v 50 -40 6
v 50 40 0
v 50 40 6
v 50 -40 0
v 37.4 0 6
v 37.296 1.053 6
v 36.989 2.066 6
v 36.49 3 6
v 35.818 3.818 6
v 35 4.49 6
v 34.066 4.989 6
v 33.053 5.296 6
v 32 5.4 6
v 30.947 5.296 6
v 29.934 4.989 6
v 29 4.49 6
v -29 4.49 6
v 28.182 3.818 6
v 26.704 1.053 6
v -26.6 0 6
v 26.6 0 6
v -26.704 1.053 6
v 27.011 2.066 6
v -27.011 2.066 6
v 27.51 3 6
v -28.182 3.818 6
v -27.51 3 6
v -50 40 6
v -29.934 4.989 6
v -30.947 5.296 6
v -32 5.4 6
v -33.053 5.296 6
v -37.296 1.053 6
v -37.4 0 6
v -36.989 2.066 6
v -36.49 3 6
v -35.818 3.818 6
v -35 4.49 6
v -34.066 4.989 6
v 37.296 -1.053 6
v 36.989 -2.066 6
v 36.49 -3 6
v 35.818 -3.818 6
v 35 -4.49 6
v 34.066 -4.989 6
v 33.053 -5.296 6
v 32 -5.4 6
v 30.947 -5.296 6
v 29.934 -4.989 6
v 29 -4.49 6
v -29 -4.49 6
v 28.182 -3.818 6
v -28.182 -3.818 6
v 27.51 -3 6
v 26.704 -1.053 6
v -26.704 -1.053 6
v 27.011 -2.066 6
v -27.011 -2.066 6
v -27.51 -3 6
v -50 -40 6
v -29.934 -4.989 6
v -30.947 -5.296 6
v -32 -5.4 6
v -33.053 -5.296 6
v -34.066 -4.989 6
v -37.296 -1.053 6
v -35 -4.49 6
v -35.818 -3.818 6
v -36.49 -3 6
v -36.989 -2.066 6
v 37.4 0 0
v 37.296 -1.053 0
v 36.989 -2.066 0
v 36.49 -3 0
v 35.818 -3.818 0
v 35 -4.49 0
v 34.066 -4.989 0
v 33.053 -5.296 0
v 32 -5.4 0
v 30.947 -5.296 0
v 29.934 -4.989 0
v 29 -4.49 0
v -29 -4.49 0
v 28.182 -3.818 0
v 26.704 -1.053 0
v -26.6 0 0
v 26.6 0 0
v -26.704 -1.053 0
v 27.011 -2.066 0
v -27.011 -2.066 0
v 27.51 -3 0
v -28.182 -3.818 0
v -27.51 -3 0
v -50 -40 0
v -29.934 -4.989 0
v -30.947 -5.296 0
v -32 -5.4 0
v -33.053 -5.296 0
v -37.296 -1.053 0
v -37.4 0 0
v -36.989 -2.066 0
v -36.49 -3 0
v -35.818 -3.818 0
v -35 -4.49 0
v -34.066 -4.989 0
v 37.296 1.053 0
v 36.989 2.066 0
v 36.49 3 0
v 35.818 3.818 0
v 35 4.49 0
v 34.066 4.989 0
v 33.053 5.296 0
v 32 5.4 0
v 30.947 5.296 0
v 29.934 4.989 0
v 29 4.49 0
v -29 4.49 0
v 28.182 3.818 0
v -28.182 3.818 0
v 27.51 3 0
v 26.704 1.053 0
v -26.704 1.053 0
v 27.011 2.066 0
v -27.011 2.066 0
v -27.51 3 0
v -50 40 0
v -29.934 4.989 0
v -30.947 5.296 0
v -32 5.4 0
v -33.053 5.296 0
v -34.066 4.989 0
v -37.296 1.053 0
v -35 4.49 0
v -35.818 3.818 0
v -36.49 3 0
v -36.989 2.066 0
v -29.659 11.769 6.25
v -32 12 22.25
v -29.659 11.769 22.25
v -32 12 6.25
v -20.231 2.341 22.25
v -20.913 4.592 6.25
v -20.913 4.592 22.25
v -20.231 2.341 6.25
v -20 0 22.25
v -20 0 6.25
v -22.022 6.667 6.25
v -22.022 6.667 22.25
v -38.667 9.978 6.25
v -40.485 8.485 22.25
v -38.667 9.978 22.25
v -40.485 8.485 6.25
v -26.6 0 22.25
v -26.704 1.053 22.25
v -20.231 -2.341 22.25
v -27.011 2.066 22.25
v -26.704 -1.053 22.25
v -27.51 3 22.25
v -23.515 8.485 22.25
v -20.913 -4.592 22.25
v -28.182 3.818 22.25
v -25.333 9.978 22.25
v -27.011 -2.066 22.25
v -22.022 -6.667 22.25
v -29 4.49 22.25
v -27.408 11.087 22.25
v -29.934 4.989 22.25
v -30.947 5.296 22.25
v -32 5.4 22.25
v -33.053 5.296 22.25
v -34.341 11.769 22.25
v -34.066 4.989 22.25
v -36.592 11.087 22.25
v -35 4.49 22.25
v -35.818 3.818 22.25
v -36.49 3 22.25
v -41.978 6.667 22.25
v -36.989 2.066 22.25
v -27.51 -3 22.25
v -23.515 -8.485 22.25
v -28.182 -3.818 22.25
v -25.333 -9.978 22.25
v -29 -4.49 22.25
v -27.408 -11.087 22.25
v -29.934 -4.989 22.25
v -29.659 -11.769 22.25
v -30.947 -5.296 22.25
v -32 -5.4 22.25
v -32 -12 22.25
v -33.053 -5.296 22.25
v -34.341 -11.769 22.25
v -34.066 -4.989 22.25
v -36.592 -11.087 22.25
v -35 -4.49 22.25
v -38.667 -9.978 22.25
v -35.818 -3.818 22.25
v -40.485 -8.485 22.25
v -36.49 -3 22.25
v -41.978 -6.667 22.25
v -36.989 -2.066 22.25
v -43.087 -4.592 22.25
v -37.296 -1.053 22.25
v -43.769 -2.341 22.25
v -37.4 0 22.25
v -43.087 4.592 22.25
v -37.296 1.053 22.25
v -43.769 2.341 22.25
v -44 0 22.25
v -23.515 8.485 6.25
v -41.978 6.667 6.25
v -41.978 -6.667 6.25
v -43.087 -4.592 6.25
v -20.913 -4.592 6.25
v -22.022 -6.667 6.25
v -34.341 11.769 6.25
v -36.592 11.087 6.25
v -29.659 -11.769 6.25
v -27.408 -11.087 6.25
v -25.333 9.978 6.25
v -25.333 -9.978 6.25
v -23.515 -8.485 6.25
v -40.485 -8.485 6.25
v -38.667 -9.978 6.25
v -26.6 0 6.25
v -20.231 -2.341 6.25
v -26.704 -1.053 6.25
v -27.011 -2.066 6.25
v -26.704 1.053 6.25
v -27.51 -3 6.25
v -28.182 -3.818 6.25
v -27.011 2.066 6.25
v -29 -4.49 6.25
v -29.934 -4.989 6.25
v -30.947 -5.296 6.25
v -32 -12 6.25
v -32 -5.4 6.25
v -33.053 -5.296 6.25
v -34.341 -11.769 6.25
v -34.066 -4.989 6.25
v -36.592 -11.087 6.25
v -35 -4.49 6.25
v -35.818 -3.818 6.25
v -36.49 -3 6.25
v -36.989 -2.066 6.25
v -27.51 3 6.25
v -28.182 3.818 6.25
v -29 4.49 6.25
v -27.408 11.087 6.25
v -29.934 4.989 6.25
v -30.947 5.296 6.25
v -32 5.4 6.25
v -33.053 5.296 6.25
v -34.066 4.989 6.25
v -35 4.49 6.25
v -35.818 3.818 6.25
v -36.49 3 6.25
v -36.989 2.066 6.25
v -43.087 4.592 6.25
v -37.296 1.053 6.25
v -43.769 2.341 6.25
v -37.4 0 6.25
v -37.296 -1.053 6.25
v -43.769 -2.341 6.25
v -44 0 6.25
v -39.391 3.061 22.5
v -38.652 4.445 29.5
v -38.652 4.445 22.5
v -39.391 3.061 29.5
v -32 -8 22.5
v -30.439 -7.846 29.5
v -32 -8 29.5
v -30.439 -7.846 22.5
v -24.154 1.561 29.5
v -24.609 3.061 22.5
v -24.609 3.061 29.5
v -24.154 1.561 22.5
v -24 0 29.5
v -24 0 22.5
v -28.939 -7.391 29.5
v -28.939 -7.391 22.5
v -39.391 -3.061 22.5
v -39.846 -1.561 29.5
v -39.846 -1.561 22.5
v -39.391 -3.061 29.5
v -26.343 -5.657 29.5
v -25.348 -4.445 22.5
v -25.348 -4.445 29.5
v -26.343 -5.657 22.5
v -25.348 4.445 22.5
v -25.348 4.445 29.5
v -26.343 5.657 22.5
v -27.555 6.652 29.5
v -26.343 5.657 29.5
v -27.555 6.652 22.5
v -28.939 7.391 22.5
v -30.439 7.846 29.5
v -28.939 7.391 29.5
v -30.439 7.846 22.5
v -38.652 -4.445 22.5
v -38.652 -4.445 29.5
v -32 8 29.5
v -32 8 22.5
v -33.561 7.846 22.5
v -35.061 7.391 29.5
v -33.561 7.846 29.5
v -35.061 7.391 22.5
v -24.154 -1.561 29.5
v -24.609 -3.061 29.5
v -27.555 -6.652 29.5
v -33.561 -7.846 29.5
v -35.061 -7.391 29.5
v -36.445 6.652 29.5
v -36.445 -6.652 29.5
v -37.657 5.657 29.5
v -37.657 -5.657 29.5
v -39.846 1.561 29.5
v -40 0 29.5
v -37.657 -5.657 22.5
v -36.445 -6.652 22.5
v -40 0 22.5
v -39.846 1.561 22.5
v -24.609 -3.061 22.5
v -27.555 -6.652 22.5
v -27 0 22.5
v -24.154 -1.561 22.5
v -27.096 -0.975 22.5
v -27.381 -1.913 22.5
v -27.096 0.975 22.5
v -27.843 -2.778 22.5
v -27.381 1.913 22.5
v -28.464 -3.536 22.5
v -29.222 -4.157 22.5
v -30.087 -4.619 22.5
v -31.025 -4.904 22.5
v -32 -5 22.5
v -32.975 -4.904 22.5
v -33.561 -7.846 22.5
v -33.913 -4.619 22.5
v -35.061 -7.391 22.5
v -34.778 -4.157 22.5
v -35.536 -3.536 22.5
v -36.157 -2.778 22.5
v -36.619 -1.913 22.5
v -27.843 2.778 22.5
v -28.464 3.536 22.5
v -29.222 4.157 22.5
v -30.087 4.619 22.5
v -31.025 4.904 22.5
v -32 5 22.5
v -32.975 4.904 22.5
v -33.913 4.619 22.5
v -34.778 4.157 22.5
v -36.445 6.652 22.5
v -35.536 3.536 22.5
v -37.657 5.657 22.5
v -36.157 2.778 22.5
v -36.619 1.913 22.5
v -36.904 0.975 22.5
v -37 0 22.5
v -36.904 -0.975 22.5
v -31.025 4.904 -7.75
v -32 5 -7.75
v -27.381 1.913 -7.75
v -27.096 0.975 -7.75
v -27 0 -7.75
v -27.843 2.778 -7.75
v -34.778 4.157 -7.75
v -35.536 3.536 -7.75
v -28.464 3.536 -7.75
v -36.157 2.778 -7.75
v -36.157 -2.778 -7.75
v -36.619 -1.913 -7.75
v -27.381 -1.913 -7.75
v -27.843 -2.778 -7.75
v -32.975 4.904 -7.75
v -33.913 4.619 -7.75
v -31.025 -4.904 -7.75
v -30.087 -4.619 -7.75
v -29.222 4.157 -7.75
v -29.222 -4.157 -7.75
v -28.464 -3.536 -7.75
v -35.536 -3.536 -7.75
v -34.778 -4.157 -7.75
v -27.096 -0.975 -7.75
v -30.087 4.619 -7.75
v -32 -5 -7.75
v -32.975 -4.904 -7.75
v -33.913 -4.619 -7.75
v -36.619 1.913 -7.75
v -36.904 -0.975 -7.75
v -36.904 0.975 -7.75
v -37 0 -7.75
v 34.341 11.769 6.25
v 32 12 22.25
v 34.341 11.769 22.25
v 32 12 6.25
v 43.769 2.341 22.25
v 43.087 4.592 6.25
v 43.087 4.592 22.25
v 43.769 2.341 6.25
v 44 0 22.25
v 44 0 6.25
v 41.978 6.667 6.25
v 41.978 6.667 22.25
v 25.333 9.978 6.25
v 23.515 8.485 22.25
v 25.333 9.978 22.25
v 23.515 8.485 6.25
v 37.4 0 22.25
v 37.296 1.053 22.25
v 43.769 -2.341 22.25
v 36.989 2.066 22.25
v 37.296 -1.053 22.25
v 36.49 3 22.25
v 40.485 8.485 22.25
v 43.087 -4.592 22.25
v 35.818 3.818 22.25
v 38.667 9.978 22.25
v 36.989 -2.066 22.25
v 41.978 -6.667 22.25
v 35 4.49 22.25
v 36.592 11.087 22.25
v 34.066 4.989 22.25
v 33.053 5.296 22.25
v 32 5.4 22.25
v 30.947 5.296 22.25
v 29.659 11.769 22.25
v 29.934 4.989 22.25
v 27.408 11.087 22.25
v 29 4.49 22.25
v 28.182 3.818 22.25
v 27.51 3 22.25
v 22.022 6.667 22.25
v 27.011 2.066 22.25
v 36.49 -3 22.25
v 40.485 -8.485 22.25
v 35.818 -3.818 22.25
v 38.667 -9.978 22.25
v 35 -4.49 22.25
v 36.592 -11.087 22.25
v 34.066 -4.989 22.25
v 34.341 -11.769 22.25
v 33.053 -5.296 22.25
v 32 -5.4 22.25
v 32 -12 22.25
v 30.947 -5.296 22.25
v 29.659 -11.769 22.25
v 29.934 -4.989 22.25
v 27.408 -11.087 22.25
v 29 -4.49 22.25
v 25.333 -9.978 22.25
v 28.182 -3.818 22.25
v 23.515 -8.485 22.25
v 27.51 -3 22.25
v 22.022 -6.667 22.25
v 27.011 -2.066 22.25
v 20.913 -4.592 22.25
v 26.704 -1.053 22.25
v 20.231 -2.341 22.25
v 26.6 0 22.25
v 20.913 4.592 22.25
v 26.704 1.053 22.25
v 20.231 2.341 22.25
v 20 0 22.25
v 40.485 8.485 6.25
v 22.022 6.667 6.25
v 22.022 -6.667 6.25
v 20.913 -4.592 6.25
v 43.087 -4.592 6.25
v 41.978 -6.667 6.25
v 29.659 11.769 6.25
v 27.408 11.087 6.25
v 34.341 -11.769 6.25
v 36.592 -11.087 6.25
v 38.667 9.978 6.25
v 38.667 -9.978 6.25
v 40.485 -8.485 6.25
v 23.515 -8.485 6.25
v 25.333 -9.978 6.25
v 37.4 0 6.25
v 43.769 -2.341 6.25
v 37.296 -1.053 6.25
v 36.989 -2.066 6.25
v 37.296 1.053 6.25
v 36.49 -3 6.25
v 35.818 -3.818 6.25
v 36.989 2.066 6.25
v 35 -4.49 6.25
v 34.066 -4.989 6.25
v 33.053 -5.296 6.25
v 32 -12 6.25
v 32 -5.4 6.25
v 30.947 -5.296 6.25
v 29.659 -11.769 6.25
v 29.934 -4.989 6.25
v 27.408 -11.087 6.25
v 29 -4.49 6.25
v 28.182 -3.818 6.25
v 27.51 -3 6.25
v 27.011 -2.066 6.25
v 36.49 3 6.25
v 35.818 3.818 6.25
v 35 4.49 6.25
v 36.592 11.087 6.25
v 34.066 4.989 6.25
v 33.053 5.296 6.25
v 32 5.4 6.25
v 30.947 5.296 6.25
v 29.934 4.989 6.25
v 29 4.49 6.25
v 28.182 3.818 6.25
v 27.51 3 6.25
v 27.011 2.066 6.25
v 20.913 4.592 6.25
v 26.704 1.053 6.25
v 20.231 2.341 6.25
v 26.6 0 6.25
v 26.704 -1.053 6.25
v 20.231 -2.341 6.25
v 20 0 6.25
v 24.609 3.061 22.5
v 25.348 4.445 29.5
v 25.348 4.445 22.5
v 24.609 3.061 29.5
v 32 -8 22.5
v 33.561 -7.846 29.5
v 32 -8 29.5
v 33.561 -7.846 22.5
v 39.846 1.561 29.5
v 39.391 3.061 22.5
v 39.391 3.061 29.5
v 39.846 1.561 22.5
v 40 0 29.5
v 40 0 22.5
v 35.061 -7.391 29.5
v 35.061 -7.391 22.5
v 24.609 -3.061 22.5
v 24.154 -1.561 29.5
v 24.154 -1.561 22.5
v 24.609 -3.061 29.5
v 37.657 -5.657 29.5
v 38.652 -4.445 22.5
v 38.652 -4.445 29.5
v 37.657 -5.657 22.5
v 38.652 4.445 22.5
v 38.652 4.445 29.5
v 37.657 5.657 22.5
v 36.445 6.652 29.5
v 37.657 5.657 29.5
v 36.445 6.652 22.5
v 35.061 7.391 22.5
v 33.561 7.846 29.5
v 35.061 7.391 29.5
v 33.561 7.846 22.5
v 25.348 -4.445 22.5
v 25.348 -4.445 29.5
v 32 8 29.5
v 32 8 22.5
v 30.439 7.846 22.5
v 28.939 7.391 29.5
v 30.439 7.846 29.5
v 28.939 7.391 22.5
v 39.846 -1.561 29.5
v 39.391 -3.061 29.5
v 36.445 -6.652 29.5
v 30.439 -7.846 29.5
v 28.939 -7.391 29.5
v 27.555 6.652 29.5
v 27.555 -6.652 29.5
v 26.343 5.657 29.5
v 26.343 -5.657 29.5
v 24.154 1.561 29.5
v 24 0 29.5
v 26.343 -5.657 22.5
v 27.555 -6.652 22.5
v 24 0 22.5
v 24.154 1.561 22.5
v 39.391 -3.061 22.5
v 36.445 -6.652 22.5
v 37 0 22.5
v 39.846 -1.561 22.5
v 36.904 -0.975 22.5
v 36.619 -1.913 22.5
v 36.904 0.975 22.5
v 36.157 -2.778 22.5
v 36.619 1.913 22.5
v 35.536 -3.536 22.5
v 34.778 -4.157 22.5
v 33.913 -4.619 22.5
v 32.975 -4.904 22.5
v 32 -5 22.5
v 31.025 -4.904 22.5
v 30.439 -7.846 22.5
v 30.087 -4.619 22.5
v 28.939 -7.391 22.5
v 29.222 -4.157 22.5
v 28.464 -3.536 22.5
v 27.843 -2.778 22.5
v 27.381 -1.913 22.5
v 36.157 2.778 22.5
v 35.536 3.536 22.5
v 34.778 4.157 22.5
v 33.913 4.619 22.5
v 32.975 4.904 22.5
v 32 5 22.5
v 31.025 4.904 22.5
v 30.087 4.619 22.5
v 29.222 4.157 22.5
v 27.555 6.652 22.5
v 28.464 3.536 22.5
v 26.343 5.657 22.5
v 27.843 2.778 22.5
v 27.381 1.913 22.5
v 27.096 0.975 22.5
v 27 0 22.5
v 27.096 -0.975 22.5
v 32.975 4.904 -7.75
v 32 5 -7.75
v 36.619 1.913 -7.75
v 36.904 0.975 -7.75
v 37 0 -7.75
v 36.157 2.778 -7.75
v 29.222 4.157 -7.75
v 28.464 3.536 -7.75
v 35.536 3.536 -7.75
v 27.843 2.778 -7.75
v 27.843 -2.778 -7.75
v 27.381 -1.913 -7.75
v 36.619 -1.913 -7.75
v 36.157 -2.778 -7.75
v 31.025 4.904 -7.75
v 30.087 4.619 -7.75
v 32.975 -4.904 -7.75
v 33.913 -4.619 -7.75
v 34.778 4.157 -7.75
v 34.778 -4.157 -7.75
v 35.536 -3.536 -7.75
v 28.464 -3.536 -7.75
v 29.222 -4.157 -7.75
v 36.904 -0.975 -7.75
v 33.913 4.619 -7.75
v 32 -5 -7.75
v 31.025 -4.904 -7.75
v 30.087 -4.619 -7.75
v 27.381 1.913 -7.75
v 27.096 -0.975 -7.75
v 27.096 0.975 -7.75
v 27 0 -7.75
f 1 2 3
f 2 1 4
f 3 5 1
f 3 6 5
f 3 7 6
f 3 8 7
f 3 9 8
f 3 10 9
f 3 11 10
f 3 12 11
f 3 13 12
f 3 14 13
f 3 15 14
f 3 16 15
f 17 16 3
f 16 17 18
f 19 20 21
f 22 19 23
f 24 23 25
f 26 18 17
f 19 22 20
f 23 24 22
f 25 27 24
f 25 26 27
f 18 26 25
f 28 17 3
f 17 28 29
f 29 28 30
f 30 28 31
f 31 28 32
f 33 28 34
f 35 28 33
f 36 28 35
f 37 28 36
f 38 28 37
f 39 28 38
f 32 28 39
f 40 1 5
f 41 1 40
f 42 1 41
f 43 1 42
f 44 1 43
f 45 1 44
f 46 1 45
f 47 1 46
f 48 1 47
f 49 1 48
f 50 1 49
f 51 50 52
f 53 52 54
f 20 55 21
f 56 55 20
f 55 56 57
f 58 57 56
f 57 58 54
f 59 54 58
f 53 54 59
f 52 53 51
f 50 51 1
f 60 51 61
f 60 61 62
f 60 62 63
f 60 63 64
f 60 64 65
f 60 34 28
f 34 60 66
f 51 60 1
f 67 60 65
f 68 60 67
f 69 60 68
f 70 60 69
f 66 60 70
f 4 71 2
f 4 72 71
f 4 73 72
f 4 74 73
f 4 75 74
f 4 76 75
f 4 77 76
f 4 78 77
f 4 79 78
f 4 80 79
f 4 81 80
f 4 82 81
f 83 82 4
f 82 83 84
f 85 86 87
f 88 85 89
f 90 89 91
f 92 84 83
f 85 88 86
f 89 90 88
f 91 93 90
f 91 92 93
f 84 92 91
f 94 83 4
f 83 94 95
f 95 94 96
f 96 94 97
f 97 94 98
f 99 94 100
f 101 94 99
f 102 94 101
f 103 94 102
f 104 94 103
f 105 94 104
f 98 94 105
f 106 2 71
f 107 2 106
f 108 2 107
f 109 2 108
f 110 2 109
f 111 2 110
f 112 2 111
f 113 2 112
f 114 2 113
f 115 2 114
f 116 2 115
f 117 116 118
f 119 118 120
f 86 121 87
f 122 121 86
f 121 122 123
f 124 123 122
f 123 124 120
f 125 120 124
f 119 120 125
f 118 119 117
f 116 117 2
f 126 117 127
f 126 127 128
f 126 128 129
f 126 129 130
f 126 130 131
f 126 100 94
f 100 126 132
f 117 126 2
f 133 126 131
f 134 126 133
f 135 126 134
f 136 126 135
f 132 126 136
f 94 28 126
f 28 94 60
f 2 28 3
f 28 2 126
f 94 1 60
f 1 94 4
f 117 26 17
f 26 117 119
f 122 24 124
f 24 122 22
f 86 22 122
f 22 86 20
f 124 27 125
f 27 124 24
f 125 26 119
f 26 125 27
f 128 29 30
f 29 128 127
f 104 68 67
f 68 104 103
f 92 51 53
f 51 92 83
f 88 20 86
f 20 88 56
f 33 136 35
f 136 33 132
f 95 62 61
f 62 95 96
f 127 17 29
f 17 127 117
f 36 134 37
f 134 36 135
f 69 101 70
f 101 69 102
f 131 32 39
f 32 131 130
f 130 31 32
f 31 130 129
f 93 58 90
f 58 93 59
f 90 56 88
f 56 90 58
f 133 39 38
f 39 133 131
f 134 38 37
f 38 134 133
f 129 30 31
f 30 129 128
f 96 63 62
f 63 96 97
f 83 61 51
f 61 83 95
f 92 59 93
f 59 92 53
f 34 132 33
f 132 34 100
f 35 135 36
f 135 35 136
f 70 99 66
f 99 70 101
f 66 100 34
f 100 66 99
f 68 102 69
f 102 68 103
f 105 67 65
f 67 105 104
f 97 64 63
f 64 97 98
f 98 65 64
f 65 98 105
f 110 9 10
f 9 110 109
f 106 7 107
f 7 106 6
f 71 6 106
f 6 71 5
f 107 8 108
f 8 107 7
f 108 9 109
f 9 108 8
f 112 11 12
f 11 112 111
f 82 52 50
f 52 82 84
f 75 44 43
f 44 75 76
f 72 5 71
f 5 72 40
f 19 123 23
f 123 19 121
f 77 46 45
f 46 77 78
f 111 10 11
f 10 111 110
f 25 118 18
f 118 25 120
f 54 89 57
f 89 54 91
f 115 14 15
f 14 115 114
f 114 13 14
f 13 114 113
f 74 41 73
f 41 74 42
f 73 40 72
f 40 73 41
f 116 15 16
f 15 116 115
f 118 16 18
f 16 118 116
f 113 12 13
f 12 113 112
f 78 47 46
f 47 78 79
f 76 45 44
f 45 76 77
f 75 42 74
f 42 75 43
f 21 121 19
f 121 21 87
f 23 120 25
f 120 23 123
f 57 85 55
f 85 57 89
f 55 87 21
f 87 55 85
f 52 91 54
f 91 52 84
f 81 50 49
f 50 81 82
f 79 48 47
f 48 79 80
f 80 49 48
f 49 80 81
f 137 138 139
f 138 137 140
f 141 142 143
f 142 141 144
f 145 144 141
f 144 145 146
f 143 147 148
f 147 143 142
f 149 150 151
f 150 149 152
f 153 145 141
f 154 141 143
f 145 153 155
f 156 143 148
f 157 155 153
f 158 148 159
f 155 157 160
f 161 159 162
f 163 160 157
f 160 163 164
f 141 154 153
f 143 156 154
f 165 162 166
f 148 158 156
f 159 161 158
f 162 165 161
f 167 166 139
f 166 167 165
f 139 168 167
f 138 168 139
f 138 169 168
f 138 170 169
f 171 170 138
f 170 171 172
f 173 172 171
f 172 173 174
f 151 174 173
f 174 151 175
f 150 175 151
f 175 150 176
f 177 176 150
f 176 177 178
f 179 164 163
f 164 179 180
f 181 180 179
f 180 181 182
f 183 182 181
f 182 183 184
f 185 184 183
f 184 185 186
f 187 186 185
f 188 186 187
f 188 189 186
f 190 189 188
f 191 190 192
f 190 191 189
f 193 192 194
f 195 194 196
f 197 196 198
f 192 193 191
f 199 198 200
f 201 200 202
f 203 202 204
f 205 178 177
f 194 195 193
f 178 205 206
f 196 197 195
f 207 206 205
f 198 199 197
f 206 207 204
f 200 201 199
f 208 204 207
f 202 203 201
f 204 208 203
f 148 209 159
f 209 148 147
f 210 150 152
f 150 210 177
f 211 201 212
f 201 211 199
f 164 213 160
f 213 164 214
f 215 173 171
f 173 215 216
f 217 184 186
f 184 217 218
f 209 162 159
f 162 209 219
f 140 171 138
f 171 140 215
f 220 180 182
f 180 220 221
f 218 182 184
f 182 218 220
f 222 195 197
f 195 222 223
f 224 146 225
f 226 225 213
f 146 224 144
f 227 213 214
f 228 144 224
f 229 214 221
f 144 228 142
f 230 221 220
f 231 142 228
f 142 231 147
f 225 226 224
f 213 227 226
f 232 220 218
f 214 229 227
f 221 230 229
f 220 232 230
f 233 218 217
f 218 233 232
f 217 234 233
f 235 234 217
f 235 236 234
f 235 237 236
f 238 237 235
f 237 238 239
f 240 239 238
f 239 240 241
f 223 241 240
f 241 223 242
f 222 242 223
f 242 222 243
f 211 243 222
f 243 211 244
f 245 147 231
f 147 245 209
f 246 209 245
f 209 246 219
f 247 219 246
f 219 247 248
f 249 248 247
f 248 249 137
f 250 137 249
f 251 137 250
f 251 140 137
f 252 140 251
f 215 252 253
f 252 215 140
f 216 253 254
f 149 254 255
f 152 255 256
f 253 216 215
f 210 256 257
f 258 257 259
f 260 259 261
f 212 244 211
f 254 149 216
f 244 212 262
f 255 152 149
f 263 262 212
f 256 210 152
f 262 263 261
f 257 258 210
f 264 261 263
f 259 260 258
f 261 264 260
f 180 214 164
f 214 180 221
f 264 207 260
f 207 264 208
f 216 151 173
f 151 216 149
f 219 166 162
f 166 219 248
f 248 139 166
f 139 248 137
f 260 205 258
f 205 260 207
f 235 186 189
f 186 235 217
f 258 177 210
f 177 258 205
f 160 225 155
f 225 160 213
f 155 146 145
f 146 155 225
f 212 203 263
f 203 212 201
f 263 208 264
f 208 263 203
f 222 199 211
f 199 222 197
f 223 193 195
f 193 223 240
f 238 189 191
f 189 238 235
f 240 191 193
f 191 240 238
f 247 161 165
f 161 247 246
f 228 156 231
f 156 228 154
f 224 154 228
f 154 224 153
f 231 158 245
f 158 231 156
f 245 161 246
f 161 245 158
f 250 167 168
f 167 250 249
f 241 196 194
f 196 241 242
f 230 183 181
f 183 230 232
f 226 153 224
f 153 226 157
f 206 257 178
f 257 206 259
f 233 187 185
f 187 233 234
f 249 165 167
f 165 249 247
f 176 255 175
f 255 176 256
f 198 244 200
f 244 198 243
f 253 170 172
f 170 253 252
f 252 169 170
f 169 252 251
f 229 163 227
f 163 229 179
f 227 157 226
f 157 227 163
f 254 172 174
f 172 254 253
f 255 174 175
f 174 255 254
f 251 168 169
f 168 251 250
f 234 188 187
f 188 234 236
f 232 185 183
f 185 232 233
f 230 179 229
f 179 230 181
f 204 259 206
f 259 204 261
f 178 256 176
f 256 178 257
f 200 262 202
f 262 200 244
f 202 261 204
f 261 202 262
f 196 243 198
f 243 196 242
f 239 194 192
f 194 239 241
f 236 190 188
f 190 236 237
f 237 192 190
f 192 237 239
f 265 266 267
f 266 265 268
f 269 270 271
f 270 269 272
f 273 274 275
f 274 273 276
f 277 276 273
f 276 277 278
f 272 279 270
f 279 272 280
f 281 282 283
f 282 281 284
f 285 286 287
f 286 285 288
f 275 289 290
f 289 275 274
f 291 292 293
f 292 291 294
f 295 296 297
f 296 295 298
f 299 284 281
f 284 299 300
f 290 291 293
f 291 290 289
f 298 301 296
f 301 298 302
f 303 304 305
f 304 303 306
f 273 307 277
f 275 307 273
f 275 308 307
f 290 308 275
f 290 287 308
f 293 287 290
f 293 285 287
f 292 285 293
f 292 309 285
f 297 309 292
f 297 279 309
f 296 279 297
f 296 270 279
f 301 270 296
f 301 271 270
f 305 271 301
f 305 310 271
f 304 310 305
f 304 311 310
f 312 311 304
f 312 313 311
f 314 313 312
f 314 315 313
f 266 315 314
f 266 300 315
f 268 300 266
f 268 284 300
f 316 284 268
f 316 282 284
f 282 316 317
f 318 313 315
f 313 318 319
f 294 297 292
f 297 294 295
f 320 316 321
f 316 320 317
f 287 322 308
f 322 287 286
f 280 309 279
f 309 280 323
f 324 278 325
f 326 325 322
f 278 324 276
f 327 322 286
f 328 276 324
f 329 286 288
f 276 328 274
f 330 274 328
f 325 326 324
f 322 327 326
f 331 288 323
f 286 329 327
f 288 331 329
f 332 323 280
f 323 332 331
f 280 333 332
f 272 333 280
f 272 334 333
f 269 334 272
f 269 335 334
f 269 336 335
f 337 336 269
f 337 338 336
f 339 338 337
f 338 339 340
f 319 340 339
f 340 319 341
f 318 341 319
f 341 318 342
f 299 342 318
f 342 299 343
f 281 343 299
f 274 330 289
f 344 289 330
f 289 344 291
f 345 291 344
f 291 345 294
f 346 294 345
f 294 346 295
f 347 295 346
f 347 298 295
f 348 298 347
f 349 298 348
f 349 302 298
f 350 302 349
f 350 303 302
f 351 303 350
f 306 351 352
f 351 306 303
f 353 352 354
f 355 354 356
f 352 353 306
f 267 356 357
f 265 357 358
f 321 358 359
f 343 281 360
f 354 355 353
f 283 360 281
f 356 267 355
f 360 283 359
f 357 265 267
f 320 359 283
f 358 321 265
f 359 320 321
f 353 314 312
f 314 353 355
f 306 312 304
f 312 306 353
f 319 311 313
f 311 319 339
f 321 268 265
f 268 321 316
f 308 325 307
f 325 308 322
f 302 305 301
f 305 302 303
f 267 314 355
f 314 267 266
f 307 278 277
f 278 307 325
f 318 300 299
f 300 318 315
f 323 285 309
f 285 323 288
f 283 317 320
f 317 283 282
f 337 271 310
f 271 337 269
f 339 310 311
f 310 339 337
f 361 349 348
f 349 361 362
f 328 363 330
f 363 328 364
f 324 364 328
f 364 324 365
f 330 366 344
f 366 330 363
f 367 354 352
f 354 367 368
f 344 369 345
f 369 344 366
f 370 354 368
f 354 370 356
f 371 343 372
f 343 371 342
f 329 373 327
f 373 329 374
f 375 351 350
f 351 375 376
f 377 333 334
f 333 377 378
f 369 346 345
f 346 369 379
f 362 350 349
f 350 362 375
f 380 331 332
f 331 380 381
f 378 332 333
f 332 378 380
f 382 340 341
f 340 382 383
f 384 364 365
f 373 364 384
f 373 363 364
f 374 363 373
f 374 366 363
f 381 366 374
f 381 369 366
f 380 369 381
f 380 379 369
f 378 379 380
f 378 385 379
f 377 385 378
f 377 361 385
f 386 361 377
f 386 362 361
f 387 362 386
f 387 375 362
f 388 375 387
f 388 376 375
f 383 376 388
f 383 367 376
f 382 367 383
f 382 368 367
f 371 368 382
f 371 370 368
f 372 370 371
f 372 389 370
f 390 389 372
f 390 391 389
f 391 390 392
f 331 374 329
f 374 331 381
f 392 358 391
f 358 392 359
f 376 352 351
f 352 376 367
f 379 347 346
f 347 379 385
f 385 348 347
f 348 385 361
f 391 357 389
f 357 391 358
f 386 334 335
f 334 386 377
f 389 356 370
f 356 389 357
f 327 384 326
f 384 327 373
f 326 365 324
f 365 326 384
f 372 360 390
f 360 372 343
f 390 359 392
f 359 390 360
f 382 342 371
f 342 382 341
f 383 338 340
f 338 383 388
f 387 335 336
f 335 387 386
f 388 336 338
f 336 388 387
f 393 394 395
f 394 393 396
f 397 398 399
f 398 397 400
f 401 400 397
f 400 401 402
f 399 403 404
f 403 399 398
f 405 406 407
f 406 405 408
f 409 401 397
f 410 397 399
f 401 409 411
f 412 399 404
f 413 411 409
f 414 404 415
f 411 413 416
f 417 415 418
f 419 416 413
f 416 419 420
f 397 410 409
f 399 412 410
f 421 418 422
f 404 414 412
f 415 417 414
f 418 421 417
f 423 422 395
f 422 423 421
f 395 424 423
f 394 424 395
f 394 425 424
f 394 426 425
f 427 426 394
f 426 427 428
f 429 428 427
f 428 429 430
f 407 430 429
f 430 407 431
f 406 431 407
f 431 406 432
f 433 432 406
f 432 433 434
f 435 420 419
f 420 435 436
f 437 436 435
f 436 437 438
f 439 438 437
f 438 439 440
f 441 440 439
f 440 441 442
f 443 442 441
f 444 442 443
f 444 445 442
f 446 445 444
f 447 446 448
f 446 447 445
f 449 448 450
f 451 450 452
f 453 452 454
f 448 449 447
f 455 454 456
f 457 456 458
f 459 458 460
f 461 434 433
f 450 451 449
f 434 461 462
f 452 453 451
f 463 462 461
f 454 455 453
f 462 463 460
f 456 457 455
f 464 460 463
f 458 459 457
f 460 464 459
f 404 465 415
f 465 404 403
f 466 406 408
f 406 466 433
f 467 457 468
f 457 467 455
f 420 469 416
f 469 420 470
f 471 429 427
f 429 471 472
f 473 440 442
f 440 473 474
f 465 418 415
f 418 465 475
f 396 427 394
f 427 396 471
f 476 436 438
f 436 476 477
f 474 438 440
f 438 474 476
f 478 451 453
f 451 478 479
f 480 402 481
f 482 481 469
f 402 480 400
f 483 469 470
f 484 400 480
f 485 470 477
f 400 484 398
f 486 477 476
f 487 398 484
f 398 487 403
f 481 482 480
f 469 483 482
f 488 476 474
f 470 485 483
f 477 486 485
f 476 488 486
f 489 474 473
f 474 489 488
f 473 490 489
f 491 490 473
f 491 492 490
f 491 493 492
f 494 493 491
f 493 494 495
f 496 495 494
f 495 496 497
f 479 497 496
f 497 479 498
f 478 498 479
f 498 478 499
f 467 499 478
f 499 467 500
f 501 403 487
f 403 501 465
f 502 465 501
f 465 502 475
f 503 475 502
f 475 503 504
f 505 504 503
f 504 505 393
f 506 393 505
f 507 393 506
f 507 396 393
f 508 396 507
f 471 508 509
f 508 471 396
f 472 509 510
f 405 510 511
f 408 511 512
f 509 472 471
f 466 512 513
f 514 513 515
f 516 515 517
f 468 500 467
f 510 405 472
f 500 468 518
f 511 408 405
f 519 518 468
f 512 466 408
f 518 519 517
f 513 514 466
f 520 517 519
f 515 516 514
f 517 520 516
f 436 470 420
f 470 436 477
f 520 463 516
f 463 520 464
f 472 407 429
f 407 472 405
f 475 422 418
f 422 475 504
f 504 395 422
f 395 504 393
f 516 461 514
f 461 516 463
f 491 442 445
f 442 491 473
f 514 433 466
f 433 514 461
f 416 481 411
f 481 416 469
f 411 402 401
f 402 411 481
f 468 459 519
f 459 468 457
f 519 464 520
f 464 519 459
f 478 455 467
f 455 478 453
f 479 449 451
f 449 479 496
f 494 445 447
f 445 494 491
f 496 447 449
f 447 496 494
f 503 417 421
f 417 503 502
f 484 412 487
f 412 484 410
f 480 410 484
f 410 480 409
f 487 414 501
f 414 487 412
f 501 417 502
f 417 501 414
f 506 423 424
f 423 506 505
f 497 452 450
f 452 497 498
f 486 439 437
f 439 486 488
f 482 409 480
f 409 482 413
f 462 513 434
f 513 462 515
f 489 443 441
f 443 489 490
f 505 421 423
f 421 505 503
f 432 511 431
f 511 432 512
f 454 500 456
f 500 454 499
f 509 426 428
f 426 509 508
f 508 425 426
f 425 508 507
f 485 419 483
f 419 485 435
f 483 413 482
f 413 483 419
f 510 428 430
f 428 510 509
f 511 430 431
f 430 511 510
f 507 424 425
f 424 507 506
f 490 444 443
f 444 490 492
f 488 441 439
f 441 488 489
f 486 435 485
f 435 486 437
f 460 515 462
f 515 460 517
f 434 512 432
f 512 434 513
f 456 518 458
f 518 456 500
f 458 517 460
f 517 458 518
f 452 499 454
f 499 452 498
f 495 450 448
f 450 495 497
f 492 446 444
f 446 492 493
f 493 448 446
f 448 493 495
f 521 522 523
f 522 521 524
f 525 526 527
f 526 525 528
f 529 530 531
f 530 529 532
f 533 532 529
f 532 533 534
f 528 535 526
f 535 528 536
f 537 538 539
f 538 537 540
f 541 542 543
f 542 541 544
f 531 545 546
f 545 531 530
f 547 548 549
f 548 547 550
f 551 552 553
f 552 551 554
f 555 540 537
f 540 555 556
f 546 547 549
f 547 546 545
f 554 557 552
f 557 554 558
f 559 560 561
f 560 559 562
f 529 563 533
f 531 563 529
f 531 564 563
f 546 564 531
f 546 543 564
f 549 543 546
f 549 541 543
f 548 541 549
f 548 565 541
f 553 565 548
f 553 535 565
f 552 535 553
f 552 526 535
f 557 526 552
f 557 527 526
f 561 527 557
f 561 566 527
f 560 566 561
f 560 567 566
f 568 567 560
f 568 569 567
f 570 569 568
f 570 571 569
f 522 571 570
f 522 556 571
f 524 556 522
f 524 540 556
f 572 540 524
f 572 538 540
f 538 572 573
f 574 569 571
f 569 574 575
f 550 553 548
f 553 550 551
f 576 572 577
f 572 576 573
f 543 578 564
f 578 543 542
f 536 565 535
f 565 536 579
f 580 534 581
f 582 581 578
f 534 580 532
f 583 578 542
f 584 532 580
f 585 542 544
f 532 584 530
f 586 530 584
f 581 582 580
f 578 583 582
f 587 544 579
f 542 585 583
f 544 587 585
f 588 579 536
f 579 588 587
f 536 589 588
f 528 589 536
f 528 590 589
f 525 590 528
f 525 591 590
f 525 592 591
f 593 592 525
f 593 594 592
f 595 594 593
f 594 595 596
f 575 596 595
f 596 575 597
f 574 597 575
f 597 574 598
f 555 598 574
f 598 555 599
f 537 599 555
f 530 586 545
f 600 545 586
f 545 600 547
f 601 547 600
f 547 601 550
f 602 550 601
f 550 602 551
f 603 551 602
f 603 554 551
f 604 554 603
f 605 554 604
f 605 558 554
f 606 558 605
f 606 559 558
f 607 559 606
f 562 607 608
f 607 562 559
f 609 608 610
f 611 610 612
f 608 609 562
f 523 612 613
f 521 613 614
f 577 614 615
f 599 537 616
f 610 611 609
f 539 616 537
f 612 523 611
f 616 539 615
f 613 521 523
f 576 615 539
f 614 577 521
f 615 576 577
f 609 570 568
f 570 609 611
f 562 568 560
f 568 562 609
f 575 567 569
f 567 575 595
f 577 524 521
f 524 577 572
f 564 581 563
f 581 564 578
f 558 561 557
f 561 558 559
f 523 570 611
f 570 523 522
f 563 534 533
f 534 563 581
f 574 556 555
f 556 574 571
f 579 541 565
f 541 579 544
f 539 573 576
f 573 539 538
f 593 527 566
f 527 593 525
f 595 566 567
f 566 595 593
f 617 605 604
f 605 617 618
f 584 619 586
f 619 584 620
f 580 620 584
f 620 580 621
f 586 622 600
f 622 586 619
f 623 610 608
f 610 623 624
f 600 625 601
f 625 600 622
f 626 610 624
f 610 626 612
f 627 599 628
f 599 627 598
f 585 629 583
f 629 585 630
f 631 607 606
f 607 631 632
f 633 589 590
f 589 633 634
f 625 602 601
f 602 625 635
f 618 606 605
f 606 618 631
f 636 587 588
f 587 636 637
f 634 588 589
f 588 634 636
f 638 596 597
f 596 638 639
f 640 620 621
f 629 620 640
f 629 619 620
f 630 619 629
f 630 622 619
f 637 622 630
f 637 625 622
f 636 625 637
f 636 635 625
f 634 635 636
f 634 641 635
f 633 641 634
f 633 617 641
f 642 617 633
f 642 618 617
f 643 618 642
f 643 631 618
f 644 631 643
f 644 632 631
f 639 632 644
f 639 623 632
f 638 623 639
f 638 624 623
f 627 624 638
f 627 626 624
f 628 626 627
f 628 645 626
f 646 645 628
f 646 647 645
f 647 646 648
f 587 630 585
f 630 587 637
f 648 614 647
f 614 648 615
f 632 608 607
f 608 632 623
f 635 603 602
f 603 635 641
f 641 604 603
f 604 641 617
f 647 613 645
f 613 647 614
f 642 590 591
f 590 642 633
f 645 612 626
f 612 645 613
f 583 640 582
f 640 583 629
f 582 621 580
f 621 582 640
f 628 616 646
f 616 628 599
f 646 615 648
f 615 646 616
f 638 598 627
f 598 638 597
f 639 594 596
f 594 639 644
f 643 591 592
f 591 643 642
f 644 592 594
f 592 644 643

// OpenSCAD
$fn = 32;

// ------------------------------------------------------------------------
// Standoff columns: 2 d24 standoffs, bolts d10
// Every part is its own module, assembly() places them once.
// ------------------------------------------------------------------------

// --- part 1 ---
module base_plate() {
  difference() {
    translate([-50, -40, 0]) cube([100, 80, 6]);
    translate([-32, 0, -1]) cylinder(h = 8, d = 10.8);
    translate([32, 0, -1]) cylinder(h = 8, d = 10.8);
  }
}

// --- part 2 ---
module spacer1() {
  difference() {
      translate([0, 0, 0]) cylinder(h = 16, d = 24);
      translate([0, 0, -1]) cylinder(h = 18, d = 10.8);
    }
}

// --- part 3 ---
module bolt1() {
  cylinder(h = 7, d = 16);
  translate([0, 0, -30.25]) cylinder(h = 30.25, d = 10);
}

// --- part 4 ---
module spacer2() {
  difference() {
      translate([0, 0, 0]) cylinder(h = 16, d = 24);
      translate([0, 0, -1]) cylinder(h = 18, d = 10.8);
    }
}

// --- part 5 ---
module bolt2() {
  cylinder(h = 7, d = 16);
  translate([0, 0, -30.25]) cylinder(h = 30.25, d = 10);
}

// --- assembly ---
module assembly() {
  translate([0, 0, 0]) rotate([0, 0, 0]) base_plate();
  translate([-32, 0, 6.25]) rotate([0, 0, 0]) spacer1();
  translate([-32, 0, 22.5]) rotate([0, 0, 0]) bolt1();
  translate([32, 0, 6.25]) rotate([0, 0, 0]) spacer2();
  translate([32, 0, 22.5]) rotate([0, 0, 0]) bolt2();
}

assembly();
